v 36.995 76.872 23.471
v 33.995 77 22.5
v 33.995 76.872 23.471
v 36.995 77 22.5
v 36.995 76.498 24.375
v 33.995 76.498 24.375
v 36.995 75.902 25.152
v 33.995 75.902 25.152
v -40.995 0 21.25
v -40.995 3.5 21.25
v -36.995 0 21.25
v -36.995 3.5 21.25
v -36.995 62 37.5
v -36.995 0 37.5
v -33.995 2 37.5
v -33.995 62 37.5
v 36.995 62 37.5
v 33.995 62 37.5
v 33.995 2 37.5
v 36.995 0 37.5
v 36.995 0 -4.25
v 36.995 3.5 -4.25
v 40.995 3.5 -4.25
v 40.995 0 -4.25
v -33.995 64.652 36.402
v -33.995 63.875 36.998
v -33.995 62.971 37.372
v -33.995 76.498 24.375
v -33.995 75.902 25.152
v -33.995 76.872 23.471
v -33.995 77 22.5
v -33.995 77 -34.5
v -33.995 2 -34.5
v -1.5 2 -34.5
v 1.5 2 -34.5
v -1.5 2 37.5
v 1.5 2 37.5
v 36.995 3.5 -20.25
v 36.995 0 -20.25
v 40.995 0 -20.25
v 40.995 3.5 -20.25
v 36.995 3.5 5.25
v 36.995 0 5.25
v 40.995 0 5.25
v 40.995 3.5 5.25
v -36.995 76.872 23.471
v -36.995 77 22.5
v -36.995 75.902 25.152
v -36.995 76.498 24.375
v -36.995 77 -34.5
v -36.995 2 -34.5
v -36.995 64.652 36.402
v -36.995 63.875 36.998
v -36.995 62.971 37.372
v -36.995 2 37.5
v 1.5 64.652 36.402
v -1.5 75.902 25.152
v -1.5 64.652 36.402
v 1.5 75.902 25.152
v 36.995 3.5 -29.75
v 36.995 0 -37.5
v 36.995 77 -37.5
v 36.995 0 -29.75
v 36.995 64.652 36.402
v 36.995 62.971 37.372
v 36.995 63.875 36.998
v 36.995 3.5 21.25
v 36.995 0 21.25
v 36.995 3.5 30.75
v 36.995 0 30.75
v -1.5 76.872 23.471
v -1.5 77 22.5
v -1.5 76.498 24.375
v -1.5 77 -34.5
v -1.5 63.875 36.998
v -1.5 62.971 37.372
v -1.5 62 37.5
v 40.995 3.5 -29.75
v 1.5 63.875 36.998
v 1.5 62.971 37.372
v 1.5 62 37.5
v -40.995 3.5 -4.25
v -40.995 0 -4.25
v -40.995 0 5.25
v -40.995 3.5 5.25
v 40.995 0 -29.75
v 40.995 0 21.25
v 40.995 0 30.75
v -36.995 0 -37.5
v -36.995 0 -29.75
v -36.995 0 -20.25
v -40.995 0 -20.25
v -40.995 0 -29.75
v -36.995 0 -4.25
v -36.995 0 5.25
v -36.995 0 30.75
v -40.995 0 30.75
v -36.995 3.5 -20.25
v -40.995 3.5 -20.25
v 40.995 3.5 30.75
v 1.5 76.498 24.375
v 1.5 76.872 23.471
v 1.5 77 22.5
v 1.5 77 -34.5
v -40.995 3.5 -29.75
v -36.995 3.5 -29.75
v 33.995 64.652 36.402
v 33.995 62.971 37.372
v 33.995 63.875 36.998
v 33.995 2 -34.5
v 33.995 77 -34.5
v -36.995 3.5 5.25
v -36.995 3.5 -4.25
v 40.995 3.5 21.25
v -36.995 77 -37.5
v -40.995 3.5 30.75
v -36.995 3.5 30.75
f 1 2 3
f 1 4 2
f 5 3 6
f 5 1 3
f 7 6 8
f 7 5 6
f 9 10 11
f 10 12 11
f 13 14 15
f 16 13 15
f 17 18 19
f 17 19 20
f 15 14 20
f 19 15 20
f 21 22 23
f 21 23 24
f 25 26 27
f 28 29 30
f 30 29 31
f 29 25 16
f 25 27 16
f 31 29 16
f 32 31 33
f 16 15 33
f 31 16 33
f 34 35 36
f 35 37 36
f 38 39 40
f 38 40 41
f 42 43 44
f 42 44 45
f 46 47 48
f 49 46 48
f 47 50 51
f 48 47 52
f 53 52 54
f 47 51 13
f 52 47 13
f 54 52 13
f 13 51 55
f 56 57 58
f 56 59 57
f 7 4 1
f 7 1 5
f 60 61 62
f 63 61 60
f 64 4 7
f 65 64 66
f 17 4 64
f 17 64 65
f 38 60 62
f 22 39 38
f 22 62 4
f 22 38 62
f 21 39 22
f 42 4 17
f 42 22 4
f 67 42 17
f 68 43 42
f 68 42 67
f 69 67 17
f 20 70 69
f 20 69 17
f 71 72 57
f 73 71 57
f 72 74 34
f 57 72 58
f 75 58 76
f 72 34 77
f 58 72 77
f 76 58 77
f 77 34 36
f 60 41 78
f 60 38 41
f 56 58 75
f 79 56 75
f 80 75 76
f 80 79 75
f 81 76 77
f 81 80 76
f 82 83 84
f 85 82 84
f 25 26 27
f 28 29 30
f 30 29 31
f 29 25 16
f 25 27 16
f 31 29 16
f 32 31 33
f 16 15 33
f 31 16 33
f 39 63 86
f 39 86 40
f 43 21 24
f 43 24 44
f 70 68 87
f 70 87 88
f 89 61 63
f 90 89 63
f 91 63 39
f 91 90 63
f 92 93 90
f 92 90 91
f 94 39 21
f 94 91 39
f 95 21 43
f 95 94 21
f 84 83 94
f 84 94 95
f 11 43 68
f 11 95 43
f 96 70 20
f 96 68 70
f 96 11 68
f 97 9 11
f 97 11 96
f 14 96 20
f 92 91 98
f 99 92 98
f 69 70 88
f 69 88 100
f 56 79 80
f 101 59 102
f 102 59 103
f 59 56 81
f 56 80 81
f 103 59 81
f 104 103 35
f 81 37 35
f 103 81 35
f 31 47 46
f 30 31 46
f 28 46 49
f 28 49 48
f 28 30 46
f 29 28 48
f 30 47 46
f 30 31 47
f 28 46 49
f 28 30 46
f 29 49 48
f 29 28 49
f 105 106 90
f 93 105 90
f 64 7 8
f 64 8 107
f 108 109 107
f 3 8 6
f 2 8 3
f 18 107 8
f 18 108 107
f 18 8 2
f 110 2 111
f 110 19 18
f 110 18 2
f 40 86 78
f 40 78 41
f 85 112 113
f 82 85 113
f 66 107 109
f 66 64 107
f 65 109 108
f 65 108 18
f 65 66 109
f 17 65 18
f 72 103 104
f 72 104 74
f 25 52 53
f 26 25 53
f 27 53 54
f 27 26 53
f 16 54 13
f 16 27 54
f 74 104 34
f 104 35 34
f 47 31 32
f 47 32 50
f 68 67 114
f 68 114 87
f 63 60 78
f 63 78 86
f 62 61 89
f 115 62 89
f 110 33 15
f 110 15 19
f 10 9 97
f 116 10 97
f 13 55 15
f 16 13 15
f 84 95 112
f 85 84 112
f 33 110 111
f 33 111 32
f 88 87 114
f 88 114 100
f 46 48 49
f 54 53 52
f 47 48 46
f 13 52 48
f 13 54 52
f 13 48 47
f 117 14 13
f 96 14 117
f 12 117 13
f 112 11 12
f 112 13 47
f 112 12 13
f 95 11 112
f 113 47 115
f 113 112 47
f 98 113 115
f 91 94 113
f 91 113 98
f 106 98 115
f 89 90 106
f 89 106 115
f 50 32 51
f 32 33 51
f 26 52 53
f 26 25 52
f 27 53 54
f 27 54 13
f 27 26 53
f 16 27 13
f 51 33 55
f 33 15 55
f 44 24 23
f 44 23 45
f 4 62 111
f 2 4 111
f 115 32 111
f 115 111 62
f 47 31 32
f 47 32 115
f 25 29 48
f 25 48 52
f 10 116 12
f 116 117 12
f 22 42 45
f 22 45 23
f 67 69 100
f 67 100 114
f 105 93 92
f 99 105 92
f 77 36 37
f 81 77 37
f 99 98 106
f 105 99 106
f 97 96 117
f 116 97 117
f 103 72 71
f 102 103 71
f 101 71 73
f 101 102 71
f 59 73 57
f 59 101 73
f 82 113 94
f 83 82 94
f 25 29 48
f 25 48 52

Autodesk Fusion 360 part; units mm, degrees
sketch "Base" plane through (0, 0, 0) normal (0, 1, 0) x (1, 0, 0) in component "DDD Wall Control Center Piece Parametric Template"
  line L0 (36.995, -37.5) -> (-36.995, -37.5)
  line L1 (-36.995, -37.5) -> (-36.995, 37.5)
  line L2 (-36.995, 37.5) -> (36.995, 37.5)
  line L3 (36.995, 37.5) -> (36.995, -37.5)
  line L4 (36.995, -37.5) -> (-36.995, 37.5) construction
  line L5 (-36.995, -37.5) -> (36.995, 37.5) construction
  dimension "d1" = 73.99
  dimension "d2" = 75
extrude "Extrude1" add sketch "Base" along normal blind 2 makes body 1 in component "DDD Wall Control Center Piece Parametric Template"
sketch "Mouting Tab" plane through (0, 0, 0) normal (1, 0, 0) x (0, 0, 1) in component "DDD Wall Control Center Piece Parametric Template"
  line L0 (-20.25, -3.5) -> (-29.75, -3.5)
  line L1 (-29.75, -3.5) -> (-29.75, 0)
  line L2 (-29.75, 0) -> (-20.25, 0)
  line L3 (-20.25, 0) -> (-20.25, -3.5)
  line L4 (-20.25, -3.5) -> (-29.75, 0) construction
  line L5 (-29.75, -3.5) -> (-20.25, 0) construction
  line L6 (1.75, 0) -> (22.5, 0)
  point P0 (-25, -1.75)
  dimension "d34" = 9.5
  dimension "d35" = 3.5
  dimension "d147" = 20.25
extrude "Extrude3" add sketch "Mouting Tab" along normal blind 4 from surface at 36.995 bodies 1 in component "DDD Wall Control Center Piece Parametric Template"
extrude "Extrude6" add sketch "Mouting Tab" against normal blind 4 from surface at -36.995 bodies 1 in component "DDD Wall Control Center Piece Parametric Template"
pattern_linear "R-Pattern2" count 1 spacing 177.59 along (0, -1, 0) count 3 spacing 25.5 along (0, 0, 1) of "Extrude6", "Extrude3" in component "DDD Wall Control Center Piece Parametric Template"
sketch "Side and Back Walls" plane through (0, 2, 0) normal (0, 1, 0) x (-1, 0, 0) in component "DDD Wall Control Center Piece Parametric Template"
  line L0 (-36.995, -37.5) -> (36.995, -37.5)
  line L1 (36.995, -37.5) -> (36.995, 37.5)
  line L2 (36.995, 37.5) -> (-36.995, 37.5)
  line L3 (-36.995, 37.5) -> (-36.995, 30.75)
  line L4 (36.995, -37.5) -> (-36.995, -37.5)
  line L5 (-36.995, -37.5) -> (-36.995, -34.5)
  line L6 (-36.995, -34.5) -> (36.995, -34.5)
  line L7 (36.995, -34.5) -> (36.995, -37.5)
  line L8 (-36.995, 37.5) -> (-33.995, 37.5)
  line L9 (-33.995, 37.5) -> (-33.995, -34.5)
  line L10 (-33.995, -34.5) -> (-36.995, -34.5)
  line L11 (-36.995, -34.5) -> (-36.995, 37.5)
  line L12 (36.995, 37.5) -> (33.995, 37.5)
  line L13 (33.995, 37.5) -> (33.995, -34.5)
  line L14 (33.995, -34.5) -> (36.995, -34.5)
  line L15 (36.995, -34.5) -> (36.995, 37.5)
  line L16 (36.995, -29.75) -> (36.995, -20.25)
  line L17 (36.995, -20.25) -> (36.995, -4.25)
  line L18 (36.995, -4.25) -> (36.995, 5.25)
  line L19 (36.995, 5.25) -> (36.995, 21.25)
  line L20 (36.995, 21.25) -> (36.995, 30.75)
  line L21 (36.995, 30.75) -> (36.995, 37.5)
  line L22 (-36.995, 30.75) -> (-36.995, 21.25)
  line L23 (-36.995, 21.25) -> (-36.995, 5.25)
  line L24 (-36.995, 5.25) -> (-36.995, -4.25)
  line L25 (-36.995, -4.25) -> (-36.995, -20.25)
  line L26 (-36.995, -20.25) -> (-36.995, -29.75)
  line L27 (-36.995, -29.75) -> (-36.995, -37.5)
  dimension "d10" = 3
  dimension "d11" = 3
  dimension "d12" = 3
extrude "Extrude7" add sketch "Side and Back Walls" along normal blind 75 contours L0 L1 L4 L5 L6 L7 L10 L14 L27 | L2 L3 L6 L8 L9 L10 L11 L22 L23 L24 L25 L26 L27 | L1 L2 L6 L12 L13 L14 L15 L16 L17 L18 L19 L20 L21 bodies 1 in component "DDD Wall Control Center Piece Parametric Template"
extrude "Extrude11" add sketch "Side and Back Walls" along normal blind 75 separate body contours L1 L2 L6 L12 L13 L14 L15 L16 L17 L18 L19 L20 L21 makes body 2 in component "DDD Wall Control Center Piece Parametric Template"
sketch "Divider Wall" plane through (-33.995, 0, 0) normal (1, 0, 0) x (0, 0, -1) in component "DDD Wall Control Center Piece Parametric Template"
  line L0 (-37.5, 2) -> (34.5, 2)
  line L1 (34.5, 2) -> (34.5, 77)
  line L2 (34.5, 77) -> (-37.5, 77)
  line L3 (-37.5, 77) -> (-37.5, 2)
  line L4 (-22.5, 77) -> (-18.75, 77)
  line L5 (-18.75, 77) -> (-18.75, 58.25)
  line L6 (-18.75, 58.25) -> (-37.5, 58.25)
  line L7 (-37.5, 58.25) -> (-37.5, 62)
  line L8 (-25.1517, 75.9017) -> (-36.4017, 64.6517)
  arc A0 (-22.5, 77) -> (-25.1517, 75.9017) centre (-22.5, 73.25) ccw
  arc A1 (-36.4017, 64.6517) -> (-37.5, 62) centre (-33.75, 62) ccw
  dimension "d59" = 18.75
  dimension "d60" = 18.75
  dimension "d62" = 18.75
  dimension "d63" = 18.75
  dimension "d70" = 3.75
  dimension "d71" = 3.75
  dimension "d72" = 3.75
  dimension "d73" = 3.75
extrude "Extrude12" cut sketch "Divider Wall" along normal up to surface (-3 mm away) and the other way up to surface (-70.99 mm away) contours L2 L3 L8 A0 A1 bodies 1 2 in component "DDD Wall Control Center Piece Parametric Template"
pattern_linear "R-Pattern3" count 1 spacing 0 along (0, -1, 0) count 2 spacing 35.495 along (1, 0, 0) of bodies 2 makes body 3 in component "DDD Wall Control Center Piece Parametric Template"
component "Divider Rack" placed x (1, 0, 0) y (0, 1, 0) z (0, 0, 1) at (0, 0, 0)
component "DDD Wall Control Center Piece Parametric Template" placed x (1, 0, 0) y (0, 1, 0) z (0, 0, 1) at (0, 0, 0) in component "Divider Rack"
equation "d1 = MMCenterPieceWidth"
equation "d2 = CenterPieceDepth"
equation "d3 = CenterPieceThickness"
equation "MMCenterPieceWidth = ( CenterPieceWidthUnits * 25.4 mm ) - 2.21 mm"
equation "CenterPieceDepth = 75 mm"
equation "CenterPieceThickness = 2 mm"
equation "d147 = CenterPieceDepth / 2 - 17.25 mm"
equation "DividerWallThickness = 3 mm"
equation "d10 = DividerWallThickness"
equation "d11 = DividerWallThickness"
equation "d12 = DividerWallThickness"
equation "DividerWallHeigth = 75 mm"
equation "d14 = DividerWallHeigth"
equation "DividerWallBevel = DividerWallHeigth - ( DividerWallHeigth * 0.75 )"
equation "d51 = DividerWallHeigth"
equation "d59 = DividerWallBevel"
equation "d60 = DividerWallBevel"
equation "d62 = DividerWallBevel"
equation "d63 = DividerWallBevel"
equation "MeasurementBetweenWalls = DividerWallSpacing - DividerWallThickness"
equation "d70 = DividerWallBevel / 5"
equation "d71 = DividerWallBevel / 5"
equation "d72 = DividerWallBevel / 5"
equation "d73 = DividerWallBevel / 5"
